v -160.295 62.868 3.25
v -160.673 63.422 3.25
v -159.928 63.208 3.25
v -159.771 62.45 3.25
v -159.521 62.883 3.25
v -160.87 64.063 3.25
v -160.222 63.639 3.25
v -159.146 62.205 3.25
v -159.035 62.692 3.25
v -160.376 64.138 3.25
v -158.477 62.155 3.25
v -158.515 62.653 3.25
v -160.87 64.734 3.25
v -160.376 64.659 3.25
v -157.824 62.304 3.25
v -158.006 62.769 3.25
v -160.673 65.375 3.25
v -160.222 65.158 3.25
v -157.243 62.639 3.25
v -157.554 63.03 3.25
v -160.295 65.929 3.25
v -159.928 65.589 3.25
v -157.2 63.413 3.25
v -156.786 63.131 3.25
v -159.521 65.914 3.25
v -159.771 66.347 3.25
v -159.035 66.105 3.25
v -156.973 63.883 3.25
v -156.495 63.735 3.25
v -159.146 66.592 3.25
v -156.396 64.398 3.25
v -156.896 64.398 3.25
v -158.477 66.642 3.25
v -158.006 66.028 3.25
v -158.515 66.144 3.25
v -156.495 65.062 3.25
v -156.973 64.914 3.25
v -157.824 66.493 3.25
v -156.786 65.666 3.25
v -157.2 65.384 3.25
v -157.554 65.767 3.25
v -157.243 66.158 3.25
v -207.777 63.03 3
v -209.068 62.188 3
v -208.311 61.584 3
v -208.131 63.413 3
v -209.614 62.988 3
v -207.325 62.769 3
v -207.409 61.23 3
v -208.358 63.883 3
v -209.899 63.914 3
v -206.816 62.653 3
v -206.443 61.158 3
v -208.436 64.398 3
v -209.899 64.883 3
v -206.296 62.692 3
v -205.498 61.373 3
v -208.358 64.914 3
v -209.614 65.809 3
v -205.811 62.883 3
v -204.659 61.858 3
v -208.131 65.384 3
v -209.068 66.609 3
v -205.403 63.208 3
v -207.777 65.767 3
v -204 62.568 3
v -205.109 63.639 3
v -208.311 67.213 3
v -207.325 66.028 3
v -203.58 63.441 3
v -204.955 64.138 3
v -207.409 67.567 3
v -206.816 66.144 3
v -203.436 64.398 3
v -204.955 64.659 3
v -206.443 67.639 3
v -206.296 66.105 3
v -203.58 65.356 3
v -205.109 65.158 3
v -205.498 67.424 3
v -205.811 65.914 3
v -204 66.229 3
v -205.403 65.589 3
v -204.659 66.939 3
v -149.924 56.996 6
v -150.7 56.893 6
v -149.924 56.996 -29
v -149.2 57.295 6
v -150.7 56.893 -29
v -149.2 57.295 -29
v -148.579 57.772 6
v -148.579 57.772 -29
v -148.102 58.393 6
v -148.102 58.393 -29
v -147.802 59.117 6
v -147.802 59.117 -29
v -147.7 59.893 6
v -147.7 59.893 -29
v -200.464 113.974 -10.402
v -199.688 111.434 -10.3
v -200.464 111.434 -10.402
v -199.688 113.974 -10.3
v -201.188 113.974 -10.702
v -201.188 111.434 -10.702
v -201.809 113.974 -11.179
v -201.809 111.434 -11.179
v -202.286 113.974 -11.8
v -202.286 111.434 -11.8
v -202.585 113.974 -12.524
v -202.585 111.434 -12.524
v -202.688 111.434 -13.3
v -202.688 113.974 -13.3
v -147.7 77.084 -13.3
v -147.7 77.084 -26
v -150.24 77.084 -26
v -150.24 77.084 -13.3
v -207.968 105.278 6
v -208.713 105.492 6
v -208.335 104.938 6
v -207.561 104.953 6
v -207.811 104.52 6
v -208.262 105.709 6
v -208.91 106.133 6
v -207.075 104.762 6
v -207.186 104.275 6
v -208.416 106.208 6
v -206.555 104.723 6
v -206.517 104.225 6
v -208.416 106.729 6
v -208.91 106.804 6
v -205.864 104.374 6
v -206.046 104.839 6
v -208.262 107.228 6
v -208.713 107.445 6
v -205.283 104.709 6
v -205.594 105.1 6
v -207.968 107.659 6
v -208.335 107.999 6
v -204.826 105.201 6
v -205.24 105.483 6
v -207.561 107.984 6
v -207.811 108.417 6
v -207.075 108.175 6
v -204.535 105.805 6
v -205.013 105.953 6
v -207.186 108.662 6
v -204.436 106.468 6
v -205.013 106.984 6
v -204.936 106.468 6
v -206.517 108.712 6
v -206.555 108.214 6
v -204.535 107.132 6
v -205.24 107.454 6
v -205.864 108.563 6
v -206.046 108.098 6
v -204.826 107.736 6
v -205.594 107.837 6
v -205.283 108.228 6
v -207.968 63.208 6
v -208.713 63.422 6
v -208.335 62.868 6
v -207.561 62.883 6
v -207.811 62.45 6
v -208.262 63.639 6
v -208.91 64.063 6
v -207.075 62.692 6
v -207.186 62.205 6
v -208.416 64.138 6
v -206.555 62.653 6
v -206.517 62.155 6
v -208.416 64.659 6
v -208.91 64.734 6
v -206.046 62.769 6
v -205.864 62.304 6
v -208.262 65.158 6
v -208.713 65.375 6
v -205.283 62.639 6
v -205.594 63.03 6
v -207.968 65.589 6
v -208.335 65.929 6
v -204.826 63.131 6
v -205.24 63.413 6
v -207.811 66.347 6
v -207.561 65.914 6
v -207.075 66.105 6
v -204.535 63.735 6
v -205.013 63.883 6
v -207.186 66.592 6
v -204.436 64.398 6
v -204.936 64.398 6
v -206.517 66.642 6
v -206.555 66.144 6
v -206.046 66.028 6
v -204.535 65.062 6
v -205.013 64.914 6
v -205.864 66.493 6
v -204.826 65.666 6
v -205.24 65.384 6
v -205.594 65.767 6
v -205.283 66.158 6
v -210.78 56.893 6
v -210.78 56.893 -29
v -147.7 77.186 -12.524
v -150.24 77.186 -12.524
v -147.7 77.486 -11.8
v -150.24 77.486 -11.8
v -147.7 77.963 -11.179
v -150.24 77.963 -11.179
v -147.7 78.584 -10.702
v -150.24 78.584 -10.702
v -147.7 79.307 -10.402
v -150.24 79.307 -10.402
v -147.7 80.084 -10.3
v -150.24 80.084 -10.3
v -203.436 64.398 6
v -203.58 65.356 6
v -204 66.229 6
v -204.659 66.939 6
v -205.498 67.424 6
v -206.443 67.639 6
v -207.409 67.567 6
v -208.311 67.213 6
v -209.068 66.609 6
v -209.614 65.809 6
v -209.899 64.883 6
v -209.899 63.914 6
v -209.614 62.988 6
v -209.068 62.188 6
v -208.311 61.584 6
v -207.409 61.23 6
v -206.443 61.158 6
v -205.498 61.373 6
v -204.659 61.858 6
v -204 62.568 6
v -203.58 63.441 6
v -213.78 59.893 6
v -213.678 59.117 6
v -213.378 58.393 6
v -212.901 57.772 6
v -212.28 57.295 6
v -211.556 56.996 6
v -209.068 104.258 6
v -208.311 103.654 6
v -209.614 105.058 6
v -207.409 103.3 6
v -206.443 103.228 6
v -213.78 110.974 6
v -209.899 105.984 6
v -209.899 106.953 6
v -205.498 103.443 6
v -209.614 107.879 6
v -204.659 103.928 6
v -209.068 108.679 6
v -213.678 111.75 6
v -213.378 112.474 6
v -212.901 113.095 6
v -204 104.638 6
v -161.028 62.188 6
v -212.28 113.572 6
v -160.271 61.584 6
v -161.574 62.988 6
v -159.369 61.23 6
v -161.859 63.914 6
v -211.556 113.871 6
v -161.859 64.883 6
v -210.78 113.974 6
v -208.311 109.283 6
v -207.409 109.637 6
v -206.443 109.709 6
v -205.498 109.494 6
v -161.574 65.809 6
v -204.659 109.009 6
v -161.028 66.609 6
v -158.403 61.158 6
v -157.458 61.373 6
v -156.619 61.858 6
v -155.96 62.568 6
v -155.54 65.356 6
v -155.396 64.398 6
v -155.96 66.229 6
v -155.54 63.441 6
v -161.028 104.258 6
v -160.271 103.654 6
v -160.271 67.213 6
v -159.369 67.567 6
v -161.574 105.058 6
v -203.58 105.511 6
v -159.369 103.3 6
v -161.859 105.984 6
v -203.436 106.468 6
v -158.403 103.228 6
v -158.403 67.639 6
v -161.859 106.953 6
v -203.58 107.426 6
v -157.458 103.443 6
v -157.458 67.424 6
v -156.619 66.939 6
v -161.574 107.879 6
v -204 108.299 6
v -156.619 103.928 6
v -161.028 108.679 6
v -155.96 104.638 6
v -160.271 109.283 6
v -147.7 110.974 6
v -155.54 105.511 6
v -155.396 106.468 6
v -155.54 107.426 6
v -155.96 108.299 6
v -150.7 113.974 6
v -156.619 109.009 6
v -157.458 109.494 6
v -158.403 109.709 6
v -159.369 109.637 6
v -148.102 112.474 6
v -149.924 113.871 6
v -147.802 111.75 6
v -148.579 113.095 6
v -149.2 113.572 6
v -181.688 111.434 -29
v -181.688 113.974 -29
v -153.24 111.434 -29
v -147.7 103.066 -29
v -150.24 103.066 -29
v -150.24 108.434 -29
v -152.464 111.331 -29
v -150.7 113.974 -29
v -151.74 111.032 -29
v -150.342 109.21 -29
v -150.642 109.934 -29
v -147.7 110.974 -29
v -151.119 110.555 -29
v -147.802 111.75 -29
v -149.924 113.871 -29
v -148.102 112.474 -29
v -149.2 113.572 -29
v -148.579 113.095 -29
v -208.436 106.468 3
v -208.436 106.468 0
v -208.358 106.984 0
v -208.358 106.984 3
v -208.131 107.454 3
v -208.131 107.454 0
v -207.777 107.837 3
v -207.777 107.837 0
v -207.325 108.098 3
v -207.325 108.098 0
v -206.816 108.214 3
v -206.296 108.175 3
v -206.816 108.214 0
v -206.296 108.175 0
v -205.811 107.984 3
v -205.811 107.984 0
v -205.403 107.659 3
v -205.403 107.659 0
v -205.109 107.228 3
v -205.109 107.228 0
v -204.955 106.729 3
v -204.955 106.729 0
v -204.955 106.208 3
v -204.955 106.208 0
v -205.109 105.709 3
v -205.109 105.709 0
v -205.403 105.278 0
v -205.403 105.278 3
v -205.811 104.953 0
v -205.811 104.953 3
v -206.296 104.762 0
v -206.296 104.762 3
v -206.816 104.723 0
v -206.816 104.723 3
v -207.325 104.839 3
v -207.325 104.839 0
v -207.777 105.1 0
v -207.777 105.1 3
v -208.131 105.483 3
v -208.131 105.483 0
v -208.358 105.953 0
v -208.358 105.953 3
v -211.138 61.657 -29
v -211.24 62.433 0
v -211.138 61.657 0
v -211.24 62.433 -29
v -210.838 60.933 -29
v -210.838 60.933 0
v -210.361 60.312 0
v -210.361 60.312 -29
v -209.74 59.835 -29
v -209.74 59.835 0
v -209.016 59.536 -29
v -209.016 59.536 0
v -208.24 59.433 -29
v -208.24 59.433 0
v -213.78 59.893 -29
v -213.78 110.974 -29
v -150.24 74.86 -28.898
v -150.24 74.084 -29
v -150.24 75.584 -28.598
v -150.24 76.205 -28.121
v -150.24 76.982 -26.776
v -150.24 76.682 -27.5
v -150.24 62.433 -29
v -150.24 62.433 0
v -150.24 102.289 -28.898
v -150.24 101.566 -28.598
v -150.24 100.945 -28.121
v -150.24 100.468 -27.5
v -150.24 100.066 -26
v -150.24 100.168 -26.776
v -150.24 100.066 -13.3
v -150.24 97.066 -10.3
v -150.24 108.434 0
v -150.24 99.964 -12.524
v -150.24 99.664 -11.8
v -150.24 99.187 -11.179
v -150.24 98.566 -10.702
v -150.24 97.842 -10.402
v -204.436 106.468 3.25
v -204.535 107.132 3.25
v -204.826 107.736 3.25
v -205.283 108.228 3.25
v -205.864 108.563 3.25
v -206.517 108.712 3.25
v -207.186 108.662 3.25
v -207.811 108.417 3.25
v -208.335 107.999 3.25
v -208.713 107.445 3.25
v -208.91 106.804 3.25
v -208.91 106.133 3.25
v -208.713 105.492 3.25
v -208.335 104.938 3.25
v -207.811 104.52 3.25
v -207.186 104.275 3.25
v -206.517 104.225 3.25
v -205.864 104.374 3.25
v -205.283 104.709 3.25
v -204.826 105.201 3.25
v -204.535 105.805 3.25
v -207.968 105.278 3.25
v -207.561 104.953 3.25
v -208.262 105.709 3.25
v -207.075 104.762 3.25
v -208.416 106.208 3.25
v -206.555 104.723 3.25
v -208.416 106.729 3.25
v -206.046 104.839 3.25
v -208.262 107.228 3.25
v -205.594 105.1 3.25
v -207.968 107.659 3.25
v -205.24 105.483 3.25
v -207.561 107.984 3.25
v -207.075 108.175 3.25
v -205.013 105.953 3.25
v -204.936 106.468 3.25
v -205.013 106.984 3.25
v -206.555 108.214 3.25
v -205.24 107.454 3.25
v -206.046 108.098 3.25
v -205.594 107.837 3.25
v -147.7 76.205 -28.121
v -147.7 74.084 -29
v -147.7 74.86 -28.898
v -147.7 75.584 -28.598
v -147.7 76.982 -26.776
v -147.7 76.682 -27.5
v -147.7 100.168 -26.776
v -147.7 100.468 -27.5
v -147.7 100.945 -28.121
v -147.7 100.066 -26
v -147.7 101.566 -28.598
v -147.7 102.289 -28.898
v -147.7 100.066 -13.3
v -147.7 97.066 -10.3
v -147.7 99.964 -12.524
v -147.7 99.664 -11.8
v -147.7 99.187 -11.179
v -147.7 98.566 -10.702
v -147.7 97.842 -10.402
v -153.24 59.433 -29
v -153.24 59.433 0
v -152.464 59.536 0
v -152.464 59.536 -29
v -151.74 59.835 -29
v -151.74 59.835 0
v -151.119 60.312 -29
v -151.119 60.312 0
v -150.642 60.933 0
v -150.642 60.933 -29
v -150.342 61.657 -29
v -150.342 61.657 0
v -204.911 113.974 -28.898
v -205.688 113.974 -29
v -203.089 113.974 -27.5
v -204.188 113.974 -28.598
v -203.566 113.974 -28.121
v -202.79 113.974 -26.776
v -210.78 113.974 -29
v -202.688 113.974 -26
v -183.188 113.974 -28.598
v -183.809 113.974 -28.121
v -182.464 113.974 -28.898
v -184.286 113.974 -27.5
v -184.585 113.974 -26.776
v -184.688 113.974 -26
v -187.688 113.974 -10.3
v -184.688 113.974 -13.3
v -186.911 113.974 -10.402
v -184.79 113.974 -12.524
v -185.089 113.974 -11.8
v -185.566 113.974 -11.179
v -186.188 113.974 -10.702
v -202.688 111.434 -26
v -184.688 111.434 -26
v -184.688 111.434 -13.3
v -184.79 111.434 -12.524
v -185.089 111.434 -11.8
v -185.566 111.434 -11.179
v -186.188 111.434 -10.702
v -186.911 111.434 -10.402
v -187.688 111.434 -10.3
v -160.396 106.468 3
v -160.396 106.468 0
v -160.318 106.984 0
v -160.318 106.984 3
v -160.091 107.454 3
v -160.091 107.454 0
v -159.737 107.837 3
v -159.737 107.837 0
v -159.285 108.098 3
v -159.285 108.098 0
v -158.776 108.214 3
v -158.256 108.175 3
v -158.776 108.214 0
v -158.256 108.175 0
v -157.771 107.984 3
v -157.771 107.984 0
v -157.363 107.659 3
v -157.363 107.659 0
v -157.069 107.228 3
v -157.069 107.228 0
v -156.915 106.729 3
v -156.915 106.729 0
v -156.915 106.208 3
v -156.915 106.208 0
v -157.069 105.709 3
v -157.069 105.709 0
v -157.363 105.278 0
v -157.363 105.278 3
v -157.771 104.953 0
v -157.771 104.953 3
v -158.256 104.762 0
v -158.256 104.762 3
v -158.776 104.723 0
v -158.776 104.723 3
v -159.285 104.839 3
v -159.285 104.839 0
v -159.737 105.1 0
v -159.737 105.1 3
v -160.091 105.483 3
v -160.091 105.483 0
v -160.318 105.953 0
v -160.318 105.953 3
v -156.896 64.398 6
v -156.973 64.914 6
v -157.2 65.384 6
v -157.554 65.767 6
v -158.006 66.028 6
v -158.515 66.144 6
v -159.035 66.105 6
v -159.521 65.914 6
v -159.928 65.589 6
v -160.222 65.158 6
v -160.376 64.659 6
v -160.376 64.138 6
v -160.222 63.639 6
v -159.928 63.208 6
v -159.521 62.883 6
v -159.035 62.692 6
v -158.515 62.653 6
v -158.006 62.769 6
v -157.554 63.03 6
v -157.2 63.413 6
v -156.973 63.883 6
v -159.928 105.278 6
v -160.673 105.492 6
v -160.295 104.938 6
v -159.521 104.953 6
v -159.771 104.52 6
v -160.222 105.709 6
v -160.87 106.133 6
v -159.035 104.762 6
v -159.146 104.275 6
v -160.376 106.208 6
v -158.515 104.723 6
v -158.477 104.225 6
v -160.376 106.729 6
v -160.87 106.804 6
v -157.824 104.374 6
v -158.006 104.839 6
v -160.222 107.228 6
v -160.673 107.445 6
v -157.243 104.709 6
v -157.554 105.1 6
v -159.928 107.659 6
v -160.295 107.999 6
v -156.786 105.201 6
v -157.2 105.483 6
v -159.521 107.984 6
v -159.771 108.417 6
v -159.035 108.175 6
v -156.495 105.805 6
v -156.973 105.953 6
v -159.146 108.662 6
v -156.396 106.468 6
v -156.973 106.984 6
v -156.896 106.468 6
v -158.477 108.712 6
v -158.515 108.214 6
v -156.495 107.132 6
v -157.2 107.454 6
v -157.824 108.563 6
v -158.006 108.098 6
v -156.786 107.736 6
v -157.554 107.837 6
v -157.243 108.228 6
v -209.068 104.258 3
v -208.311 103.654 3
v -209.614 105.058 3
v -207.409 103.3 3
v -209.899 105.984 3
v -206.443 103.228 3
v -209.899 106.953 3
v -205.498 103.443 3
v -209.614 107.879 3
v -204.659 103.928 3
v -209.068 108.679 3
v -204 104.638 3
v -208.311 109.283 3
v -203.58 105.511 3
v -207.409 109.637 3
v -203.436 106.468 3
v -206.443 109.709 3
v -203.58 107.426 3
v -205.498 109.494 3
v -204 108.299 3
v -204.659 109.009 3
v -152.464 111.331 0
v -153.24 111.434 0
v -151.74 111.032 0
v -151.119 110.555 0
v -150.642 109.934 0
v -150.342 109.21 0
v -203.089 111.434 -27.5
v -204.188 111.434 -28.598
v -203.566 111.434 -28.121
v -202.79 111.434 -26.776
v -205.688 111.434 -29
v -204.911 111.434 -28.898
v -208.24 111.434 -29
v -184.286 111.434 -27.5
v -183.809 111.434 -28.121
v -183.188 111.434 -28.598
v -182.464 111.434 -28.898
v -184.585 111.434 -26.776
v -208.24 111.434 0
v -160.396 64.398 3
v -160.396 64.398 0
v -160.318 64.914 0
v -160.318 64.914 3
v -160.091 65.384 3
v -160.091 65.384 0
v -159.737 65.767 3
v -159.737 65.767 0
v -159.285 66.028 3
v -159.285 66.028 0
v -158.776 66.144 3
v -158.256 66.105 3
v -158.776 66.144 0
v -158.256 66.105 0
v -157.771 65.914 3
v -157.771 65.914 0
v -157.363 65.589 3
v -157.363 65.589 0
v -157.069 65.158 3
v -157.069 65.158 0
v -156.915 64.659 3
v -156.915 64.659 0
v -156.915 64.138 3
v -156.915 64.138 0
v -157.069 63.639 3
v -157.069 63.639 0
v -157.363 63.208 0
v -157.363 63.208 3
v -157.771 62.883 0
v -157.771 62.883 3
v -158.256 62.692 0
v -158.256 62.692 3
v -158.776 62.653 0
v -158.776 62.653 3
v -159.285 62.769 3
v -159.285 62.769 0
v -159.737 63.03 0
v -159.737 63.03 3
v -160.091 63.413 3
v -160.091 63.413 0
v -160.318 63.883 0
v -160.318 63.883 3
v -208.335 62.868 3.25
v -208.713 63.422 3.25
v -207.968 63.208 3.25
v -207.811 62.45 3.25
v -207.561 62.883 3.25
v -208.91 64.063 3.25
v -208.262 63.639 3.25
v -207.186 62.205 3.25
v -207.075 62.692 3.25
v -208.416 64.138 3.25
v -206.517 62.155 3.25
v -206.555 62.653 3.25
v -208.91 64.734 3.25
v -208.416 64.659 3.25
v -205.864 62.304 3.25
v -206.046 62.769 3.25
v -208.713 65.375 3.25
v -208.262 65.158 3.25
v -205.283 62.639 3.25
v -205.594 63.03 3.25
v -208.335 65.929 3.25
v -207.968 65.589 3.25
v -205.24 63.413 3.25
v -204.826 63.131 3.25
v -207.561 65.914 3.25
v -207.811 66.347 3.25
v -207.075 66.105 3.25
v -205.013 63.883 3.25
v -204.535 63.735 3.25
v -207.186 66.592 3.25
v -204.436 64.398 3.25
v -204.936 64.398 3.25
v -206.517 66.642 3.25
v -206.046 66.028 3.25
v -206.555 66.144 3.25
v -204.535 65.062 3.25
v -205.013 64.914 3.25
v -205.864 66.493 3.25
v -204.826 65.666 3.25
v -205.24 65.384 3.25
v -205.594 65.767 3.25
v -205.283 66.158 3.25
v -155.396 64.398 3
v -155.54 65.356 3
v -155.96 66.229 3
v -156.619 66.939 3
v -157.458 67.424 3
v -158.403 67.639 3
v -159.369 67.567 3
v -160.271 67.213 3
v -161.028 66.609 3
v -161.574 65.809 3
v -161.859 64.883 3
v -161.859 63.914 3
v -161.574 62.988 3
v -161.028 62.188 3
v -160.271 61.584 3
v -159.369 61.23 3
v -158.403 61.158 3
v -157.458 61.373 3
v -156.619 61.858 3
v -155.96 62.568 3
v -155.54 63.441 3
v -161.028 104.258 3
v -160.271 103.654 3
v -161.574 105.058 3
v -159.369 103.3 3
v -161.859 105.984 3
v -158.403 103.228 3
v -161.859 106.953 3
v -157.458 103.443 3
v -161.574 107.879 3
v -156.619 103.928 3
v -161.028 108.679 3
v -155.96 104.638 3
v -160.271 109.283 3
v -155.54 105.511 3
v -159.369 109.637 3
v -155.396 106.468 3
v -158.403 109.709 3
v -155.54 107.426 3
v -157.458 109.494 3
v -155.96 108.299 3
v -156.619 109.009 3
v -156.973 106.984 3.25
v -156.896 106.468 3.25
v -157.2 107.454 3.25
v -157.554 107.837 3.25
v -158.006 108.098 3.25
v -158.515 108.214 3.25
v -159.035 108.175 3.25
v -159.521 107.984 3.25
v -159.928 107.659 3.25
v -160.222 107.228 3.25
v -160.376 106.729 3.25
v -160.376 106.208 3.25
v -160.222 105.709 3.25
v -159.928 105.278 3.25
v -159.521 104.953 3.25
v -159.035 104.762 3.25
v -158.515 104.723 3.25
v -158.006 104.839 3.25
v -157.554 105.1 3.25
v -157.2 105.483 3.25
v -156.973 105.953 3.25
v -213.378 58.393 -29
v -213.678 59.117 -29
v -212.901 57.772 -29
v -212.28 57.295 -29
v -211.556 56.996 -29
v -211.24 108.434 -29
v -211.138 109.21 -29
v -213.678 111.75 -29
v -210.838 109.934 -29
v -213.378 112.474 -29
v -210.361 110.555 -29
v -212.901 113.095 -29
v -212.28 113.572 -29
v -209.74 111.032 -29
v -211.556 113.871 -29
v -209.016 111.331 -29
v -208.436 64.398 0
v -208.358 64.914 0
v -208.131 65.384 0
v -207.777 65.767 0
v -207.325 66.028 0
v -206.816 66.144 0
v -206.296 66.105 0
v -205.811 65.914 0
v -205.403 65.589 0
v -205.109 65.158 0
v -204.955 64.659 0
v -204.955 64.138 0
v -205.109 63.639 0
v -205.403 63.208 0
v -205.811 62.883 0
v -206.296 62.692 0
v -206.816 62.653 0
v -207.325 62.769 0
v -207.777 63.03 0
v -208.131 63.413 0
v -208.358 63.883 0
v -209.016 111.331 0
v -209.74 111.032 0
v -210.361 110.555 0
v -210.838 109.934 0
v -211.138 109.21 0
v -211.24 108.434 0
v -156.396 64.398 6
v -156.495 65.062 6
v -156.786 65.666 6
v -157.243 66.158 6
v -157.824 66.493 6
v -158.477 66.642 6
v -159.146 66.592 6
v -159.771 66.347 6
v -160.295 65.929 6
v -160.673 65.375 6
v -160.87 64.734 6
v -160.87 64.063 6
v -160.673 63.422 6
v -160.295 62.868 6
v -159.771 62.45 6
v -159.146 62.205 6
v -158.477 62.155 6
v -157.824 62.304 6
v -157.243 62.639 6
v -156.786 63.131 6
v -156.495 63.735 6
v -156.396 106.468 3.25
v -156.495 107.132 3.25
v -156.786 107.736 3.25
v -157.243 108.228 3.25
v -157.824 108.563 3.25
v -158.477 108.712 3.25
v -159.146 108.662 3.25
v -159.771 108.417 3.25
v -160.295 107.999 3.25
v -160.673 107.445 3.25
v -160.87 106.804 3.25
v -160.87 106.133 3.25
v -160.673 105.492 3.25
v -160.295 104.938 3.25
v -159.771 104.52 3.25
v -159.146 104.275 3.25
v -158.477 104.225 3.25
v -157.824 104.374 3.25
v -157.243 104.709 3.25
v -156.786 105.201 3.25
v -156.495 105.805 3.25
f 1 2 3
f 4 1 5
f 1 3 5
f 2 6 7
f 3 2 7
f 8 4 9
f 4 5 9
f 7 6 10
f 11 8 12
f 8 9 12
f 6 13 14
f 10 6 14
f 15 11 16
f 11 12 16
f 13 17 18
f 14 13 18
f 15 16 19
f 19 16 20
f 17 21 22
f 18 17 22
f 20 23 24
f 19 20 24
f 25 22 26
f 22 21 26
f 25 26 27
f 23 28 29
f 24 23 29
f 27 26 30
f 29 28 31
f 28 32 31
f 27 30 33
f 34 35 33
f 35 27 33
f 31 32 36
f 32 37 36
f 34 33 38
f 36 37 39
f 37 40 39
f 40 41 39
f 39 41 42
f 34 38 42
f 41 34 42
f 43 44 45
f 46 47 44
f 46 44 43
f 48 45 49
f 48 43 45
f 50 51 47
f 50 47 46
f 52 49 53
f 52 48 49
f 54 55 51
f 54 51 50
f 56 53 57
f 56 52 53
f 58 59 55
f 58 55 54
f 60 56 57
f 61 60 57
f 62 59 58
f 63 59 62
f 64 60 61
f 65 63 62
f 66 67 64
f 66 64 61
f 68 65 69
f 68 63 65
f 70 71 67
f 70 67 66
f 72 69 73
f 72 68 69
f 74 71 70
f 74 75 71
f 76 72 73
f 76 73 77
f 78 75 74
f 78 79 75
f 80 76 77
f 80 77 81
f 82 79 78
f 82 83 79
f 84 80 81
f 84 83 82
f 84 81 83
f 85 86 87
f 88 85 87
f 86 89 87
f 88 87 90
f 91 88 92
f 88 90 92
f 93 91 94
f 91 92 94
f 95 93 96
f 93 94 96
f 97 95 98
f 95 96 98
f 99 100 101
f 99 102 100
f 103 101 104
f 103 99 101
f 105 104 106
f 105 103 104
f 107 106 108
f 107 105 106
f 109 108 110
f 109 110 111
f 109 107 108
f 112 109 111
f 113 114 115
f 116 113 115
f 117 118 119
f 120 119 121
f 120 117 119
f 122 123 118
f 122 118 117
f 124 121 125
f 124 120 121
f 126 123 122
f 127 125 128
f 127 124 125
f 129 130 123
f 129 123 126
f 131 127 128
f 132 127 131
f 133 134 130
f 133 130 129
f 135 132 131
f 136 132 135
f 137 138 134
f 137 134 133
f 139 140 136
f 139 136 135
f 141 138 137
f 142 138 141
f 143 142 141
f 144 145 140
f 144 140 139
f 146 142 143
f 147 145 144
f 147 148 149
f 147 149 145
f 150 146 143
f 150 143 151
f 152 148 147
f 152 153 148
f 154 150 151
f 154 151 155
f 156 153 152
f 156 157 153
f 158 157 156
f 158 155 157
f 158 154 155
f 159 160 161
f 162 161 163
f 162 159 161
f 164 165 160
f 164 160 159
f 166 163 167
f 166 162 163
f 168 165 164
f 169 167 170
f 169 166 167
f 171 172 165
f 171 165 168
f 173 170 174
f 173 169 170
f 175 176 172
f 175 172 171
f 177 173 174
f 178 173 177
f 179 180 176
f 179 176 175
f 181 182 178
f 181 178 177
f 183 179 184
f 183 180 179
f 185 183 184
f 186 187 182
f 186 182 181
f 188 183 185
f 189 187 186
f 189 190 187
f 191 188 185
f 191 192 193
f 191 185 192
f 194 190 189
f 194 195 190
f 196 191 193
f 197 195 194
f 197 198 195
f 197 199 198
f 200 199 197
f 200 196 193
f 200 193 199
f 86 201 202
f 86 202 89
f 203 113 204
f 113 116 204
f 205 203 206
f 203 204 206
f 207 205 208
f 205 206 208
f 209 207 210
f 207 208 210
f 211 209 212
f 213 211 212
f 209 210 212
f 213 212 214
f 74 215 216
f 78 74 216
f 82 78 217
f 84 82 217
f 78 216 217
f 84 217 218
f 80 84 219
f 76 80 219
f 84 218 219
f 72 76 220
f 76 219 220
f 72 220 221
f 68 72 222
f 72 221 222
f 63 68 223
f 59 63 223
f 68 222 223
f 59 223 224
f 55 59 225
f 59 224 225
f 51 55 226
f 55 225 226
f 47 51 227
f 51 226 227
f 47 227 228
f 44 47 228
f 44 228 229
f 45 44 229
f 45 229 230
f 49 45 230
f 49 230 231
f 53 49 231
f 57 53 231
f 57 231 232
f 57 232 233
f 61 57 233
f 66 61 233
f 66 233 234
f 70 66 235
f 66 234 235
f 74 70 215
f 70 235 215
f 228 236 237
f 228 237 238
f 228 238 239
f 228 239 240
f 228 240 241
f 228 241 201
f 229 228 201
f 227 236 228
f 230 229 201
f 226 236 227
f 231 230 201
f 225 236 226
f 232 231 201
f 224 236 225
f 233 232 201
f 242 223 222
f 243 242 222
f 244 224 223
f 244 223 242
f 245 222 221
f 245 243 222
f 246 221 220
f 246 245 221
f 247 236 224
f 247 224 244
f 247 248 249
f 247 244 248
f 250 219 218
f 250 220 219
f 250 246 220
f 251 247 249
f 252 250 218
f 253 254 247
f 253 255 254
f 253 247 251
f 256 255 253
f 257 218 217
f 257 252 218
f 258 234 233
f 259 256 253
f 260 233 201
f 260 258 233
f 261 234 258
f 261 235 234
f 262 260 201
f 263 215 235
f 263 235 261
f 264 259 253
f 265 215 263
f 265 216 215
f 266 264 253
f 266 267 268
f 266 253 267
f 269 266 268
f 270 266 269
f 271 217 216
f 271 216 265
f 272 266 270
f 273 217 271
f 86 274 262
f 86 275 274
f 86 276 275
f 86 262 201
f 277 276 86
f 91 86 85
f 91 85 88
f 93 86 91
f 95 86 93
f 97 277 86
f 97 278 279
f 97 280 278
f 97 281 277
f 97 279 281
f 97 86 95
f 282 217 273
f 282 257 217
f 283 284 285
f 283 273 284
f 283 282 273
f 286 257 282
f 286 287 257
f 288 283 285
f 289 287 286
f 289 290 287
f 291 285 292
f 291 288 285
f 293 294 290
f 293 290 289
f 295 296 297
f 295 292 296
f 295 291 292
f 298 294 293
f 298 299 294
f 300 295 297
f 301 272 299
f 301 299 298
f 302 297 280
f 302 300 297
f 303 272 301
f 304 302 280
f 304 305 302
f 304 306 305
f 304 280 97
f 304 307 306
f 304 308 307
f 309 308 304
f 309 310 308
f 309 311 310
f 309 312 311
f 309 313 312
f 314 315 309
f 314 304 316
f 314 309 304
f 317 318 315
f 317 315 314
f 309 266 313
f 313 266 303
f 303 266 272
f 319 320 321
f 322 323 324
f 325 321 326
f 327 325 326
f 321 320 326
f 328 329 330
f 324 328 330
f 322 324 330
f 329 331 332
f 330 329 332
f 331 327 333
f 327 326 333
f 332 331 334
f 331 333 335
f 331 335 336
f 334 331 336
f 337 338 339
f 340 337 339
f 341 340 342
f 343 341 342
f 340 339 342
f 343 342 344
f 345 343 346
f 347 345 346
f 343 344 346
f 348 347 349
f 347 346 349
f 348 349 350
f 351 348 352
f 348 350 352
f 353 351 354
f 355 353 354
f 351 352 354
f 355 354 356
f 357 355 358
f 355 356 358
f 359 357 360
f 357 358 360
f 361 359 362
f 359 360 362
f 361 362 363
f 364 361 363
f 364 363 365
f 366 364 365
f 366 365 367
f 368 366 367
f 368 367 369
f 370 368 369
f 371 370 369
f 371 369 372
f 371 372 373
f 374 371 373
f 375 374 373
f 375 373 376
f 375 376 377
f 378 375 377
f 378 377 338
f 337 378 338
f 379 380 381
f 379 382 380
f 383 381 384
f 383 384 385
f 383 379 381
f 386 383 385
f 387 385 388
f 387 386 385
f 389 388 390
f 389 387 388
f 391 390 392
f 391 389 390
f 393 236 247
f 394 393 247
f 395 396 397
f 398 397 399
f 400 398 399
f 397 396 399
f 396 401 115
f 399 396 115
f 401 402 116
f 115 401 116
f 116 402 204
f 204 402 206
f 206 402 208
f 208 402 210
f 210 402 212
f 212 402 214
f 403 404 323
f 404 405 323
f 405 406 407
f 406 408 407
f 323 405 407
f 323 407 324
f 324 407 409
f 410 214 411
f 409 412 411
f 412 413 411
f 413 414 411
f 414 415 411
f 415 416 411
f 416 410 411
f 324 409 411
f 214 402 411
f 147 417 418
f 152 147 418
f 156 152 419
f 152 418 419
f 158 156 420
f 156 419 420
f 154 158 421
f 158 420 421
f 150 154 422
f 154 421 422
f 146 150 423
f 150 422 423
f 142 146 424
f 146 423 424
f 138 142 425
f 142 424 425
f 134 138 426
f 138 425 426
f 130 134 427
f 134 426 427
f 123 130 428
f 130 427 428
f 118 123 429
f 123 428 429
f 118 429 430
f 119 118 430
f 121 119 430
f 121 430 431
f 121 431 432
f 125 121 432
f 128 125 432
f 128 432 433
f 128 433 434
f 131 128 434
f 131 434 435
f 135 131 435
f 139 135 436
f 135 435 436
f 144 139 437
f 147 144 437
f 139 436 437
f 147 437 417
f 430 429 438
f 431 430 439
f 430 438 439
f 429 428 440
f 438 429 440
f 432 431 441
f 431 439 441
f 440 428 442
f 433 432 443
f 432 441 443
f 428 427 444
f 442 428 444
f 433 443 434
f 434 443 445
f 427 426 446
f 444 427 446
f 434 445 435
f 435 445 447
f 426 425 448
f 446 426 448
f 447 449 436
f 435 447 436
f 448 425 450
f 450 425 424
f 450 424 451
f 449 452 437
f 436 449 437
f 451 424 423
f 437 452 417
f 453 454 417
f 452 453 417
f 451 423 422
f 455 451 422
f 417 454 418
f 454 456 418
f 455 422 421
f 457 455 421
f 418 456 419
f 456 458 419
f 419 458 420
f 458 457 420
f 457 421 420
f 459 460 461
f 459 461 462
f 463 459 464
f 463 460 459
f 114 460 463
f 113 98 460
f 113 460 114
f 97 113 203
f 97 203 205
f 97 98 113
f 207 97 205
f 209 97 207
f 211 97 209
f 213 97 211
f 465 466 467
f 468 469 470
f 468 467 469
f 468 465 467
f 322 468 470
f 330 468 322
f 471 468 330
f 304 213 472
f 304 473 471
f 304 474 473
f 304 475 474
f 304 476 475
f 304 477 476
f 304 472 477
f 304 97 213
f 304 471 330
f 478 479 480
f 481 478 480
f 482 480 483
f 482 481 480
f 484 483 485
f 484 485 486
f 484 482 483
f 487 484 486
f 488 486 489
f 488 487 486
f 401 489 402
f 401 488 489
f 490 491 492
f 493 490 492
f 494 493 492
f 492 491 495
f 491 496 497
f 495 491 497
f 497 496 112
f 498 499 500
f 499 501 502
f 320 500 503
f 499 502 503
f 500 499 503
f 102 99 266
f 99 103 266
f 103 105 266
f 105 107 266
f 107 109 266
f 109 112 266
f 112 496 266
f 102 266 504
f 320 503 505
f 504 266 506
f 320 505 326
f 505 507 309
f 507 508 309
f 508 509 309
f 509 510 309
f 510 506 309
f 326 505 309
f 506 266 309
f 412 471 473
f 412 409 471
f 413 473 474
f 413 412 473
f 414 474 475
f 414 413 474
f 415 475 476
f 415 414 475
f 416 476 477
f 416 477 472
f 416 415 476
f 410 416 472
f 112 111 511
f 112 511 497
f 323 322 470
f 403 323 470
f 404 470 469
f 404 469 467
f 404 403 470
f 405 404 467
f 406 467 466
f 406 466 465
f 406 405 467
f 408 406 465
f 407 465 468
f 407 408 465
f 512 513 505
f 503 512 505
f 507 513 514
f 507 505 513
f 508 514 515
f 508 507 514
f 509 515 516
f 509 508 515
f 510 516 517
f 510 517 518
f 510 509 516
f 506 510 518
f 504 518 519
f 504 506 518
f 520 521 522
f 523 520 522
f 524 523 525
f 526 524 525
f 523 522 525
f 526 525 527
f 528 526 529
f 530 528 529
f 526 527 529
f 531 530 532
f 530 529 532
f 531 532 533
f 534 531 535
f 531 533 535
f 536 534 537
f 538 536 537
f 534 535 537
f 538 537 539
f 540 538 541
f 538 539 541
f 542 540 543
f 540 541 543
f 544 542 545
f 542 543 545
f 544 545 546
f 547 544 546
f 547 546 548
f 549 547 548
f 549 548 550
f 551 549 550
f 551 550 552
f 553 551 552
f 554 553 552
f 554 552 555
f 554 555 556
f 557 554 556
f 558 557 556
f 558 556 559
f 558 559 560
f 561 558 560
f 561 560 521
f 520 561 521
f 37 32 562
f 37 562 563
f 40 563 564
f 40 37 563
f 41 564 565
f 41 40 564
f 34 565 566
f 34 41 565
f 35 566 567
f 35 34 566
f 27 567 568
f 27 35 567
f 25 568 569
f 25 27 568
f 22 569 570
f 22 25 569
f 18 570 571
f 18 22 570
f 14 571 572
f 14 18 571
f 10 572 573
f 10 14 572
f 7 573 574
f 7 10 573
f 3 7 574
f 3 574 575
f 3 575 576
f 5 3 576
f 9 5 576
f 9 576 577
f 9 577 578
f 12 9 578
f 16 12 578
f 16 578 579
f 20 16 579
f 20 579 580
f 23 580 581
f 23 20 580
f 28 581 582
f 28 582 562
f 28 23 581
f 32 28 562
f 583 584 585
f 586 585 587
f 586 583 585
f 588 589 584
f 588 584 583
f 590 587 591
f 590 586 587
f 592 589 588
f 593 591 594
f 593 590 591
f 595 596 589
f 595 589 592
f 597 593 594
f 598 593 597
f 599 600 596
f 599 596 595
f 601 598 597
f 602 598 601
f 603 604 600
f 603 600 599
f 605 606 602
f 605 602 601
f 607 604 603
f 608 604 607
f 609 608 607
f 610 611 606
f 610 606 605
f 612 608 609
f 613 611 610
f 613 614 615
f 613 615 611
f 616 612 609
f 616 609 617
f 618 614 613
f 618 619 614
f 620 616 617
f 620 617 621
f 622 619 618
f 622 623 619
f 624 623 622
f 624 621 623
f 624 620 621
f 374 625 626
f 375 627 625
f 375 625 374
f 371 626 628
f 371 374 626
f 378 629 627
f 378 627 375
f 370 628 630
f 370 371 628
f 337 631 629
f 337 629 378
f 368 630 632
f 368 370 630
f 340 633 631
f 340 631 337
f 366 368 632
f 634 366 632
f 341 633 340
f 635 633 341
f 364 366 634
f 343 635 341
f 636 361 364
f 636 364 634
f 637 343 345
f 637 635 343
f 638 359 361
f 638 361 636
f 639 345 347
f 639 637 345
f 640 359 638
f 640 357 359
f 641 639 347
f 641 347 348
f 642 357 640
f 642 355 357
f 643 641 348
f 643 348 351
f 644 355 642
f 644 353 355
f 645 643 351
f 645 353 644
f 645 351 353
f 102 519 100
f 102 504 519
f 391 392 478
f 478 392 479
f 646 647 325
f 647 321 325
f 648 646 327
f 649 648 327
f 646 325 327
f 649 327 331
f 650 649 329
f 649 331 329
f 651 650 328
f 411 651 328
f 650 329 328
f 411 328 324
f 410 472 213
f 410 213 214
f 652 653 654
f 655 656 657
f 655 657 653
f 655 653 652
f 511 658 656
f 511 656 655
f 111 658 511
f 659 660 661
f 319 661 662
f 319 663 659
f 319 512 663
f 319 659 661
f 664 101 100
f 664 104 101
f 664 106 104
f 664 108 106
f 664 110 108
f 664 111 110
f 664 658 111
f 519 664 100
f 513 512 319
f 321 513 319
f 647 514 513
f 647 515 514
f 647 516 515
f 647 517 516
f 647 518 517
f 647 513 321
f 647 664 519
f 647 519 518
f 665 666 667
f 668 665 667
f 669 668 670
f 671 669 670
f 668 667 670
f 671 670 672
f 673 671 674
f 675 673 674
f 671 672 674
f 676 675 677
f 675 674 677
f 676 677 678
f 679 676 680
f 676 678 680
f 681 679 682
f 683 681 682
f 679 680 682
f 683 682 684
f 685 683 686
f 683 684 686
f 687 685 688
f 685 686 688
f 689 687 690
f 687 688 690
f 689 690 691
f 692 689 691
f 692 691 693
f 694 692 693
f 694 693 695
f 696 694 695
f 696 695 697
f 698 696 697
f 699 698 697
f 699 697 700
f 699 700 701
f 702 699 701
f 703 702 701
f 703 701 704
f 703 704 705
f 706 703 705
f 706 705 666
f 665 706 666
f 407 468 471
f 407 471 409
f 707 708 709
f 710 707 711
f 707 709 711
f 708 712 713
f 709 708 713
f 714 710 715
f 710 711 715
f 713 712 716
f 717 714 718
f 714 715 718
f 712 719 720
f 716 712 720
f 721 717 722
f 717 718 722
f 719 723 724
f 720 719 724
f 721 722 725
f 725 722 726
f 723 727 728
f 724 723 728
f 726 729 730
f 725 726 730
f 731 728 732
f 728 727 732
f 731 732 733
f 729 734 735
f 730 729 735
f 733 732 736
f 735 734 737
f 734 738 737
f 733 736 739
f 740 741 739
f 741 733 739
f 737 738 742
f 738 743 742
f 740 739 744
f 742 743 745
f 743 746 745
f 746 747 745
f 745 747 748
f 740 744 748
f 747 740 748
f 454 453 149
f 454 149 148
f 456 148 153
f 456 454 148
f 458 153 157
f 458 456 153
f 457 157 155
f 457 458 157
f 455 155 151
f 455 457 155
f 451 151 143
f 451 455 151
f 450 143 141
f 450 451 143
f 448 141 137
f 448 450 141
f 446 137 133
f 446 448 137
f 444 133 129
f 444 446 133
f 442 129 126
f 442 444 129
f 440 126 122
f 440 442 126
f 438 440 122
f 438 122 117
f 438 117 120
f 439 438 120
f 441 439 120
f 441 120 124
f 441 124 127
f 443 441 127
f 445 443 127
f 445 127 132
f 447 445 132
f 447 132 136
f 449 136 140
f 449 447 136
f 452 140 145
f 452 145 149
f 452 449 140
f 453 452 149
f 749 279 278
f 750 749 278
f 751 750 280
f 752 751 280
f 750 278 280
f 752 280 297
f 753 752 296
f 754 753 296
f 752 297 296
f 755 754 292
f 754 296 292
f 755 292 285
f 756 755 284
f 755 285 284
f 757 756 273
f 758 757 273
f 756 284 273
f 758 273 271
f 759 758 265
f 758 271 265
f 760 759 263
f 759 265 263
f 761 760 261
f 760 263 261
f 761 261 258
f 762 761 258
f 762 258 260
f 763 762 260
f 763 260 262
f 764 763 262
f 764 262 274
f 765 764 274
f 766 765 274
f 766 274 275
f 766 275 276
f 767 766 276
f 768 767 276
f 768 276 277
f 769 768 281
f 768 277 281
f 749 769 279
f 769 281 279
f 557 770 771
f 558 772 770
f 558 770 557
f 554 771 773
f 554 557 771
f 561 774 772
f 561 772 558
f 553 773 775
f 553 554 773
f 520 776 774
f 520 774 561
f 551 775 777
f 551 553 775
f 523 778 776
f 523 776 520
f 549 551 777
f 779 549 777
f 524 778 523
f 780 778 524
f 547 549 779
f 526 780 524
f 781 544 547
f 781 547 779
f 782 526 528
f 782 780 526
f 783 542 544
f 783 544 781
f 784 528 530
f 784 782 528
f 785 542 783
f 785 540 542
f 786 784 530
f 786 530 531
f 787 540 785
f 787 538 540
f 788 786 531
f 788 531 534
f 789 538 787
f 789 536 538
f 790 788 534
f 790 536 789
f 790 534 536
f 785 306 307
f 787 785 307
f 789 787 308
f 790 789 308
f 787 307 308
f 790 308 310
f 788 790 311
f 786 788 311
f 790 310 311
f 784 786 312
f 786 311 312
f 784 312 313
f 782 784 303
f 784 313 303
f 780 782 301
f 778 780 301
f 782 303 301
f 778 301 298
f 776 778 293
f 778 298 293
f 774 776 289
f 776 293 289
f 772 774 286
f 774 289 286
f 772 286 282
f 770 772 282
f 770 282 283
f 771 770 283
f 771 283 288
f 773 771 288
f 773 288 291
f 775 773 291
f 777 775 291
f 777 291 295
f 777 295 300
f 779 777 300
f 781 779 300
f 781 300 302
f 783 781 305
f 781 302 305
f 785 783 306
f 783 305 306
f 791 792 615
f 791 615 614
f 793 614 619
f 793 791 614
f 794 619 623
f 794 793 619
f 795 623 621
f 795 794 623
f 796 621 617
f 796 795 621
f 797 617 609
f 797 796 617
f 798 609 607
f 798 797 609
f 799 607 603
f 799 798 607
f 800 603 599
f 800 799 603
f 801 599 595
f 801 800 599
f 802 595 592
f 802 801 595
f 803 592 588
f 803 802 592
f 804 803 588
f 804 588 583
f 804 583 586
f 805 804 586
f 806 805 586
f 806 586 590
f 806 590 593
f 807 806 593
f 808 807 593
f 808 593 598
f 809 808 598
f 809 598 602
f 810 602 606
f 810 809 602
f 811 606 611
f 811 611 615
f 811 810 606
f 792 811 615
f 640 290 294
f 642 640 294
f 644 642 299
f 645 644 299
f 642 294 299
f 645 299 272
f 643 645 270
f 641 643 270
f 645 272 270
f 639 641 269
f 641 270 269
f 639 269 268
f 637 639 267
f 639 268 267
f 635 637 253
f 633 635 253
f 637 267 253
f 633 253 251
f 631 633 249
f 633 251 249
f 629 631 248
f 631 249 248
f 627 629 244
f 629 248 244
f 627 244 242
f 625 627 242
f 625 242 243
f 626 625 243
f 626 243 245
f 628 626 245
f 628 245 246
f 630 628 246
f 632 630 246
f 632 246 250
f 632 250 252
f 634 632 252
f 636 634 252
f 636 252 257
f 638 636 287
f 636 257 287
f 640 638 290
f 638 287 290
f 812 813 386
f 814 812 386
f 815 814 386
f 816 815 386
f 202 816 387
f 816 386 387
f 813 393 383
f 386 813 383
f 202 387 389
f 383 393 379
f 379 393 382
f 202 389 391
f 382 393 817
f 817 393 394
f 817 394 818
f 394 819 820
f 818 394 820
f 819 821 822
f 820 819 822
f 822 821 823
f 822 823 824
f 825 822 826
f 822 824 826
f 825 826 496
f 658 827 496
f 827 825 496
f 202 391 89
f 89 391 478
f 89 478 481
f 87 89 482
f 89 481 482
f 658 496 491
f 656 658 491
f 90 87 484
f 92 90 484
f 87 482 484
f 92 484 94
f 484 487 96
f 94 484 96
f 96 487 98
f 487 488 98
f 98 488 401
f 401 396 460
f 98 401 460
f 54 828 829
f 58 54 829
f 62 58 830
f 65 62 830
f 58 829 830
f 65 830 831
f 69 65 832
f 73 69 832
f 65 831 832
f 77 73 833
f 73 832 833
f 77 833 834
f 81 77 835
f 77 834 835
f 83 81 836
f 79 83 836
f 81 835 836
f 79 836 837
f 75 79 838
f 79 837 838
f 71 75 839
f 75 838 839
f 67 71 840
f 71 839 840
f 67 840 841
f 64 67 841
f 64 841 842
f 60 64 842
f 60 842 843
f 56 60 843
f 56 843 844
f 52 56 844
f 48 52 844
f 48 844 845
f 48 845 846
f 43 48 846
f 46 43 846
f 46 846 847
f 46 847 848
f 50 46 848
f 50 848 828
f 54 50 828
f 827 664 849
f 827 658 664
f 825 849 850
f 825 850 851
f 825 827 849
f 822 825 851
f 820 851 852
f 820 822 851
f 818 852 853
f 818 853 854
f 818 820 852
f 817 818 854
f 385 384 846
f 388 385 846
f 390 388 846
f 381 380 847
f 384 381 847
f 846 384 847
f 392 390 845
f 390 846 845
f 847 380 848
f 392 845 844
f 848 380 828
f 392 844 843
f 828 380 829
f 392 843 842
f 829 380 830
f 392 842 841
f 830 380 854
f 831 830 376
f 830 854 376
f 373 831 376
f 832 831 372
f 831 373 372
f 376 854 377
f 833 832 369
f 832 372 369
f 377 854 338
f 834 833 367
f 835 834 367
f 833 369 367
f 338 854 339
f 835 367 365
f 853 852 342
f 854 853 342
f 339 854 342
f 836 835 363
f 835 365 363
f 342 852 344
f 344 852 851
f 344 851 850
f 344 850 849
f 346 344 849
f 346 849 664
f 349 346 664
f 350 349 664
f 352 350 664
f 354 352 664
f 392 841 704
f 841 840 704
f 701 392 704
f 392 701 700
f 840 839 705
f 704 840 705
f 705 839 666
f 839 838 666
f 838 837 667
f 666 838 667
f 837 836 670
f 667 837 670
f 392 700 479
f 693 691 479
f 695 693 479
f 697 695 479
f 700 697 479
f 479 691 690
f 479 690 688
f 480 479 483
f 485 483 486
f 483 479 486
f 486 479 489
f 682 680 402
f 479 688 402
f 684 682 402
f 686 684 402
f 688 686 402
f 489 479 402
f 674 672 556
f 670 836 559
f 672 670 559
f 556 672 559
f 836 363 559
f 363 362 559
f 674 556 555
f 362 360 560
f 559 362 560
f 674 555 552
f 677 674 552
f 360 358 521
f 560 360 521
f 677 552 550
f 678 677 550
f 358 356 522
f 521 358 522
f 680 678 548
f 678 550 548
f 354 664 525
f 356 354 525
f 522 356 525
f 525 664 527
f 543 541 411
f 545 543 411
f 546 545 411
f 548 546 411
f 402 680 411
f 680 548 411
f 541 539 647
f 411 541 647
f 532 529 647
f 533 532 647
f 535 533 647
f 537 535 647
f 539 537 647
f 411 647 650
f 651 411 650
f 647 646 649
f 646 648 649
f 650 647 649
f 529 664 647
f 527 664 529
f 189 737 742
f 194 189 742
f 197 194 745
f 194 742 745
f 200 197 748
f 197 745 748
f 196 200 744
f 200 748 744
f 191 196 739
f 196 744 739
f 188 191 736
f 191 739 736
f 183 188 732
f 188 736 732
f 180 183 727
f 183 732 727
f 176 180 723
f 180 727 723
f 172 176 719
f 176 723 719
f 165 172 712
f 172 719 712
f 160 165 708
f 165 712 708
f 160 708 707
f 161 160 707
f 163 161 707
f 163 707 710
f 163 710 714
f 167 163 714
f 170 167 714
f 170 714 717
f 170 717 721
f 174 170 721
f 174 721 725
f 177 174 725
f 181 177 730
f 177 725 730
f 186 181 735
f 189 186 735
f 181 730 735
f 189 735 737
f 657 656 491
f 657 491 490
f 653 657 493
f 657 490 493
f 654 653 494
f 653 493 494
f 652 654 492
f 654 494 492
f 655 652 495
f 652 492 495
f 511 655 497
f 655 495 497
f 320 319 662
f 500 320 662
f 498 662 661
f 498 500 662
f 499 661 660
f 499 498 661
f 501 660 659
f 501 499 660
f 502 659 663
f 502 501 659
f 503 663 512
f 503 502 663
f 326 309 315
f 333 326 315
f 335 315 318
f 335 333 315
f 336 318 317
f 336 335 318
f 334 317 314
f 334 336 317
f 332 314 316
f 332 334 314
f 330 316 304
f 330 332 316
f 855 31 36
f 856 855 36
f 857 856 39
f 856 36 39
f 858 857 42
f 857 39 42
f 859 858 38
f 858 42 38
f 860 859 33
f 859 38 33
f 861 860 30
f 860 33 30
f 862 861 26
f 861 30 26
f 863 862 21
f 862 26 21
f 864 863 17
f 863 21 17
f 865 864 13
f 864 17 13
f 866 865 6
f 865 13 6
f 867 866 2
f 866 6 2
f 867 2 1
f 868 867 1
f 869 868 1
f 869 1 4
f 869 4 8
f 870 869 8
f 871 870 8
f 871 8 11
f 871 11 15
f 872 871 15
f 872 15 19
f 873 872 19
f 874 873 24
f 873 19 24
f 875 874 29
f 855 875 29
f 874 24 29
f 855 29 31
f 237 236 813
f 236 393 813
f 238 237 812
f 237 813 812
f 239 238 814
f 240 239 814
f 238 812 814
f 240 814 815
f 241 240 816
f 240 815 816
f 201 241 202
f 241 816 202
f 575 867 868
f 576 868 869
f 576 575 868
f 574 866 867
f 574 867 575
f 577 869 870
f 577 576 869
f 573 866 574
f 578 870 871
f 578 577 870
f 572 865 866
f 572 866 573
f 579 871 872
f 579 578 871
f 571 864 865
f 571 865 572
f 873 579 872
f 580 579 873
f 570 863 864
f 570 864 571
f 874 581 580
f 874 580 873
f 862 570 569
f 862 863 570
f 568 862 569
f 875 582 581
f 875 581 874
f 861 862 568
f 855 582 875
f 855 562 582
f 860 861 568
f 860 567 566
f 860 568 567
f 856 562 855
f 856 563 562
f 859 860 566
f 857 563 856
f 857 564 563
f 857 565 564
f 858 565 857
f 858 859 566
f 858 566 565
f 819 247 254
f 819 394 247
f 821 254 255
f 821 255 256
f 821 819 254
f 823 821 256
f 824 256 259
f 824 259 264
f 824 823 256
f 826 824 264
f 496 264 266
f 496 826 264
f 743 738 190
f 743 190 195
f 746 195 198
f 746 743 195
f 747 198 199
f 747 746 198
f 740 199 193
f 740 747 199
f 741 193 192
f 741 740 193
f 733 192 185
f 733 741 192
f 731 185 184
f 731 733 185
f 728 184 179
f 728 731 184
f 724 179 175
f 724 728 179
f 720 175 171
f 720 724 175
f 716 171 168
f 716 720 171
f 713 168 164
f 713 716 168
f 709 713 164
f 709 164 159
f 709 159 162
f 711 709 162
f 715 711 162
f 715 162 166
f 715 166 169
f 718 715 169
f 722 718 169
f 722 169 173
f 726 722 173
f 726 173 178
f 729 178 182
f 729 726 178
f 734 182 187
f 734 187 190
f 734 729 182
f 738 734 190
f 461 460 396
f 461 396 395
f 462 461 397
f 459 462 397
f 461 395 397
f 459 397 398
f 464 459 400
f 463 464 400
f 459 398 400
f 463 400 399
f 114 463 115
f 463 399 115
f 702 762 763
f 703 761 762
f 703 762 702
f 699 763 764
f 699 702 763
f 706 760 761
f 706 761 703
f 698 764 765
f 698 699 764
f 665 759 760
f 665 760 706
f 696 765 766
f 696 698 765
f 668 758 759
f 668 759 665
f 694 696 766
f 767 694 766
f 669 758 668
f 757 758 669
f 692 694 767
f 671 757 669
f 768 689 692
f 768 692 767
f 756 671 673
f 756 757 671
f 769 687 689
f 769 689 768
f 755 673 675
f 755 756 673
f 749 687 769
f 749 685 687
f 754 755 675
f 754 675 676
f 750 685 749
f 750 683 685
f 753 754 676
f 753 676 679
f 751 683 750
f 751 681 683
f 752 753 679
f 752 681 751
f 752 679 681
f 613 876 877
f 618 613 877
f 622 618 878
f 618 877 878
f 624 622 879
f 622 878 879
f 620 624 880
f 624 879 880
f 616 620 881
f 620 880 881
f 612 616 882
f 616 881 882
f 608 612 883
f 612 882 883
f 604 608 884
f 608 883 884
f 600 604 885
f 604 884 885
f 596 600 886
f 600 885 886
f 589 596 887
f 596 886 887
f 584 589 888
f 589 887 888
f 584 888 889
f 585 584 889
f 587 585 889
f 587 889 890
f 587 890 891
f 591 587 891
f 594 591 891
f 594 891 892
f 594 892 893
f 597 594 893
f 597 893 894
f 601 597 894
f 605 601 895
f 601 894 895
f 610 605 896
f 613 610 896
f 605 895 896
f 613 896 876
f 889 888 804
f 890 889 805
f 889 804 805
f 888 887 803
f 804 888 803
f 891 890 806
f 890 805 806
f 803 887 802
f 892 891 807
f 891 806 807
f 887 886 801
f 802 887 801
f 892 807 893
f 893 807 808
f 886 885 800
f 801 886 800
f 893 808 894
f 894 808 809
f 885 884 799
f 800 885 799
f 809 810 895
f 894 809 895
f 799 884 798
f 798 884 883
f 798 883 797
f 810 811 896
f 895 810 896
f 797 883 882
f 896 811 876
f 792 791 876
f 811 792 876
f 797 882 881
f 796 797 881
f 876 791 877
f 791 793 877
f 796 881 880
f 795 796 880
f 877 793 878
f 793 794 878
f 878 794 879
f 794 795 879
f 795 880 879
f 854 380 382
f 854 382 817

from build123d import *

# Parameters (mm, degrees)
SKETCH1_W             = 61
SKETCH1_H             = 52
BOSS_EXTRUDE1_DEPTH   = 6
SKETCH2_W             = 66.08
SKETCH2_H             = 57.08
SKETCH2_W_2           = 61
SKETCH2_H_2           = 52
BOSS_EXTRUDE2_DEPTH   = 35
SKETCH3_W             = 18
SKETCH3_H             = 2.54
SKETCH3_W_2           = 2.54
SKETCH3_H_2           = 22.981894062
CUT_EXTRUDE1_DEPTH    = 18.7
FILLET1_R             = 3
SKETCH4_R             = 1.75
CUT_EXTRUDE3_DEPTH    = 244.993536095
SKETCH5_R             = 3.25
CUT_EXTRUDE4_DEPTH    = 3
BOSS_EXTRUDE3_START   = -2.75
SKETCH6_R             = 2.25
SKETCH6_R_2           = 1.75
BOSS_EXTRUDE3_DEPTH   = 2.75
BOSS_EXTRUDE3_2_DEPTH = 2.75
BOSS_EXTRUDE3_3_DEPTH = 2.75
BOSS_EXTRUDE3_4_DEPTH = 2.75


with BuildPart() as part:
    # Sketch1 → Boss-Extrude1 (new body)
    with BuildSketch(Plane.XY):
        with Locations((-180.739996617, 85.4335)):
            Rectangle(SKETCH1_W, SKETCH1_H)
    extrude(amount=BOSS_EXTRUDE1_DEPTH)

    # Sketch2 → Boss-Extrude2 (add)
    with BuildSketch(Plane.XY.offset(6)):
        with Locations((-180.739996617, 85.4335)):
            Rectangle(SKETCH2_W, SKETCH2_H)
        with Locations((-180.739996617, 85.4335)):
            Rectangle(SKETCH2_W_2, SKETCH2_H_2, mode=Mode.SUBTRACT)
    extrude(amount=-BOSS_EXTRUDE2_DEPTH)

    # Sketch3 → Cut-Extrude1 (cut)
    with BuildSketch(Plane(origin=(0, 0, -29), x_dir=(-1, 0, 0), z_dir=(0, 0, -1))):
        with Locations((193.68754036, 112.7035)):
            Rectangle(SKETCH3_W, SKETCH3_H)
        with Locations((148.969996617, 88.574898358)):
            Rectangle(SKETCH3_W_2, SKETCH3_H_2)
    extrude(amount=-CUT_EXTRUDE1_DEPTH, mode=Mode.SUBTRACT)

    # Fillet1
    fillet1_edges = [part.edges().sort_by_distance(p)[0] for p in [
        (-150.239996617, 111.4335, -14.5),
        (-150.239996617, 59.4335, -14.5),
        (-211.239996617, 59.4335, -14.5),
        (-211.239996617, 111.4335, -14.5),
        (-213.779996617, 113.9735, -11.5),
        (-147.699996617, 113.9735, -11.5),
        (-147.699996617, 56.8935, -11.5),
        (-213.779996617, 56.8935, -11.5),
        (-202.68754036, 112.7035, -29),
        (-184.68754036, 112.7035, -29),
        (-184.68754036, 112.7035, -10.3),
        (-202.68754036, 112.7035, -10.3),
        (-148.969996617, 100.065845389, -29),
        (-148.969996617, 77.083951327, -29),
        (-148.969996617, 100.065845389, -10.3),
        (-148.969996617, 77.083951327, -10.3),
    ]]
    fillet(fillet1_edges, radius=FILLET1_R)

    # Sketch4 → Cut-Extrude3 (cut, through all)
    with BuildSketch(Plane(origin=(0, 0, 0), x_dir=(-1, 0, 0), z_dir=(0, 0, -1))):
        with Locations((206.685524627, 64.3985)):
            Circle(SKETCH4_R)
        with Locations((158.645524627, 64.3985)):
            Circle(SKETCH4_R)
        with Locations((206.685524627, 106.4685)):
            Circle(SKETCH4_R)
        with Locations((158.645524627, 106.4685)):
            Circle(SKETCH4_R)
    extrude(amount=-CUT_EXTRUDE3_DEPTH, mode=Mode.SUBTRACT)

    # Sketch5 → Cut-Extrude4 (cut)
    with BuildSketch(Plane.XY.offset(6)):
        with Locations((-206.685524627, 64.3985)):
            Circle(SKETCH5_R)
        with Locations((-206.685524627, 106.4685)):
            Circle(SKETCH5_R)
        with Locations((-158.645524627, 64.3985)):
            Circle(SKETCH5_R)
        with Locations((-158.645524627, 106.4685)):
            Circle(SKETCH5_R)
    extrude(amount=-CUT_EXTRUDE4_DEPTH, mode=Mode.SUBTRACT)


with BuildPart() as body_2:
    # Sketch6 → Boss-Extrude3 (new body)
    with BuildSketch(Plane.XY.offset(6).offset(BOSS_EXTRUDE3_START)):
        with Locations((-158.645524627, 64.3985)):
            Circle(SKETCH6_R)
        with Locations((-158.645524627, 64.3985)):
            Circle(SKETCH6_R_2, mode=Mode.SUBTRACT)
    extrude(amount=BOSS_EXTRUDE3_DEPTH)


with BuildPart() as body_3:
    # Sketch6 → Boss-Extrude3 2 (new body)
    with BuildSketch(Plane.XY.offset(6).offset(BOSS_EXTRUDE3_START)):
        with Locations((-206.685524627, 106.4685)):
            Circle(SKETCH6_R)
        with Locations((-206.685524627, 106.4685)):
            Circle(SKETCH6_R_2, mode=Mode.SUBTRACT)
    extrude(amount=BOSS_EXTRUDE3_2_DEPTH)


with BuildPart() as body_4:
    # Sketch6 → Boss-Extrude3 3 (new body)
    with BuildSketch(Plane.XY.offset(6).offset(BOSS_EXTRUDE3_START)):
        with Locations((-158.645524627, 106.4685)):
            Circle(SKETCH6_R)
        with Locations((-158.645524627, 106.4685)):
            Circle(SKETCH6_R_2, mode=Mode.SUBTRACT)
    extrude(amount=BOSS_EXTRUDE3_3_DEPTH)


with BuildPart() as body_5:
    # Sketch6 → Boss-Extrude3 4 (new body)
    with BuildSketch(Plane.XY.offset(6).offset(BOSS_EXTRUDE3_START)):
        with Locations((-206.685524627, 64.3985)):
            Circle(SKETCH6_R)
        with Locations((-206.685524627, 64.3985)):
            Circle(SKETCH6_R_2, mode=Mode.SUBTRACT)
    extrude(amount=BOSS_EXTRUDE3_4_DEPTH)


solid = Compound([part.part, body_2.part, body_3.part, body_4.part, body_5.part])
